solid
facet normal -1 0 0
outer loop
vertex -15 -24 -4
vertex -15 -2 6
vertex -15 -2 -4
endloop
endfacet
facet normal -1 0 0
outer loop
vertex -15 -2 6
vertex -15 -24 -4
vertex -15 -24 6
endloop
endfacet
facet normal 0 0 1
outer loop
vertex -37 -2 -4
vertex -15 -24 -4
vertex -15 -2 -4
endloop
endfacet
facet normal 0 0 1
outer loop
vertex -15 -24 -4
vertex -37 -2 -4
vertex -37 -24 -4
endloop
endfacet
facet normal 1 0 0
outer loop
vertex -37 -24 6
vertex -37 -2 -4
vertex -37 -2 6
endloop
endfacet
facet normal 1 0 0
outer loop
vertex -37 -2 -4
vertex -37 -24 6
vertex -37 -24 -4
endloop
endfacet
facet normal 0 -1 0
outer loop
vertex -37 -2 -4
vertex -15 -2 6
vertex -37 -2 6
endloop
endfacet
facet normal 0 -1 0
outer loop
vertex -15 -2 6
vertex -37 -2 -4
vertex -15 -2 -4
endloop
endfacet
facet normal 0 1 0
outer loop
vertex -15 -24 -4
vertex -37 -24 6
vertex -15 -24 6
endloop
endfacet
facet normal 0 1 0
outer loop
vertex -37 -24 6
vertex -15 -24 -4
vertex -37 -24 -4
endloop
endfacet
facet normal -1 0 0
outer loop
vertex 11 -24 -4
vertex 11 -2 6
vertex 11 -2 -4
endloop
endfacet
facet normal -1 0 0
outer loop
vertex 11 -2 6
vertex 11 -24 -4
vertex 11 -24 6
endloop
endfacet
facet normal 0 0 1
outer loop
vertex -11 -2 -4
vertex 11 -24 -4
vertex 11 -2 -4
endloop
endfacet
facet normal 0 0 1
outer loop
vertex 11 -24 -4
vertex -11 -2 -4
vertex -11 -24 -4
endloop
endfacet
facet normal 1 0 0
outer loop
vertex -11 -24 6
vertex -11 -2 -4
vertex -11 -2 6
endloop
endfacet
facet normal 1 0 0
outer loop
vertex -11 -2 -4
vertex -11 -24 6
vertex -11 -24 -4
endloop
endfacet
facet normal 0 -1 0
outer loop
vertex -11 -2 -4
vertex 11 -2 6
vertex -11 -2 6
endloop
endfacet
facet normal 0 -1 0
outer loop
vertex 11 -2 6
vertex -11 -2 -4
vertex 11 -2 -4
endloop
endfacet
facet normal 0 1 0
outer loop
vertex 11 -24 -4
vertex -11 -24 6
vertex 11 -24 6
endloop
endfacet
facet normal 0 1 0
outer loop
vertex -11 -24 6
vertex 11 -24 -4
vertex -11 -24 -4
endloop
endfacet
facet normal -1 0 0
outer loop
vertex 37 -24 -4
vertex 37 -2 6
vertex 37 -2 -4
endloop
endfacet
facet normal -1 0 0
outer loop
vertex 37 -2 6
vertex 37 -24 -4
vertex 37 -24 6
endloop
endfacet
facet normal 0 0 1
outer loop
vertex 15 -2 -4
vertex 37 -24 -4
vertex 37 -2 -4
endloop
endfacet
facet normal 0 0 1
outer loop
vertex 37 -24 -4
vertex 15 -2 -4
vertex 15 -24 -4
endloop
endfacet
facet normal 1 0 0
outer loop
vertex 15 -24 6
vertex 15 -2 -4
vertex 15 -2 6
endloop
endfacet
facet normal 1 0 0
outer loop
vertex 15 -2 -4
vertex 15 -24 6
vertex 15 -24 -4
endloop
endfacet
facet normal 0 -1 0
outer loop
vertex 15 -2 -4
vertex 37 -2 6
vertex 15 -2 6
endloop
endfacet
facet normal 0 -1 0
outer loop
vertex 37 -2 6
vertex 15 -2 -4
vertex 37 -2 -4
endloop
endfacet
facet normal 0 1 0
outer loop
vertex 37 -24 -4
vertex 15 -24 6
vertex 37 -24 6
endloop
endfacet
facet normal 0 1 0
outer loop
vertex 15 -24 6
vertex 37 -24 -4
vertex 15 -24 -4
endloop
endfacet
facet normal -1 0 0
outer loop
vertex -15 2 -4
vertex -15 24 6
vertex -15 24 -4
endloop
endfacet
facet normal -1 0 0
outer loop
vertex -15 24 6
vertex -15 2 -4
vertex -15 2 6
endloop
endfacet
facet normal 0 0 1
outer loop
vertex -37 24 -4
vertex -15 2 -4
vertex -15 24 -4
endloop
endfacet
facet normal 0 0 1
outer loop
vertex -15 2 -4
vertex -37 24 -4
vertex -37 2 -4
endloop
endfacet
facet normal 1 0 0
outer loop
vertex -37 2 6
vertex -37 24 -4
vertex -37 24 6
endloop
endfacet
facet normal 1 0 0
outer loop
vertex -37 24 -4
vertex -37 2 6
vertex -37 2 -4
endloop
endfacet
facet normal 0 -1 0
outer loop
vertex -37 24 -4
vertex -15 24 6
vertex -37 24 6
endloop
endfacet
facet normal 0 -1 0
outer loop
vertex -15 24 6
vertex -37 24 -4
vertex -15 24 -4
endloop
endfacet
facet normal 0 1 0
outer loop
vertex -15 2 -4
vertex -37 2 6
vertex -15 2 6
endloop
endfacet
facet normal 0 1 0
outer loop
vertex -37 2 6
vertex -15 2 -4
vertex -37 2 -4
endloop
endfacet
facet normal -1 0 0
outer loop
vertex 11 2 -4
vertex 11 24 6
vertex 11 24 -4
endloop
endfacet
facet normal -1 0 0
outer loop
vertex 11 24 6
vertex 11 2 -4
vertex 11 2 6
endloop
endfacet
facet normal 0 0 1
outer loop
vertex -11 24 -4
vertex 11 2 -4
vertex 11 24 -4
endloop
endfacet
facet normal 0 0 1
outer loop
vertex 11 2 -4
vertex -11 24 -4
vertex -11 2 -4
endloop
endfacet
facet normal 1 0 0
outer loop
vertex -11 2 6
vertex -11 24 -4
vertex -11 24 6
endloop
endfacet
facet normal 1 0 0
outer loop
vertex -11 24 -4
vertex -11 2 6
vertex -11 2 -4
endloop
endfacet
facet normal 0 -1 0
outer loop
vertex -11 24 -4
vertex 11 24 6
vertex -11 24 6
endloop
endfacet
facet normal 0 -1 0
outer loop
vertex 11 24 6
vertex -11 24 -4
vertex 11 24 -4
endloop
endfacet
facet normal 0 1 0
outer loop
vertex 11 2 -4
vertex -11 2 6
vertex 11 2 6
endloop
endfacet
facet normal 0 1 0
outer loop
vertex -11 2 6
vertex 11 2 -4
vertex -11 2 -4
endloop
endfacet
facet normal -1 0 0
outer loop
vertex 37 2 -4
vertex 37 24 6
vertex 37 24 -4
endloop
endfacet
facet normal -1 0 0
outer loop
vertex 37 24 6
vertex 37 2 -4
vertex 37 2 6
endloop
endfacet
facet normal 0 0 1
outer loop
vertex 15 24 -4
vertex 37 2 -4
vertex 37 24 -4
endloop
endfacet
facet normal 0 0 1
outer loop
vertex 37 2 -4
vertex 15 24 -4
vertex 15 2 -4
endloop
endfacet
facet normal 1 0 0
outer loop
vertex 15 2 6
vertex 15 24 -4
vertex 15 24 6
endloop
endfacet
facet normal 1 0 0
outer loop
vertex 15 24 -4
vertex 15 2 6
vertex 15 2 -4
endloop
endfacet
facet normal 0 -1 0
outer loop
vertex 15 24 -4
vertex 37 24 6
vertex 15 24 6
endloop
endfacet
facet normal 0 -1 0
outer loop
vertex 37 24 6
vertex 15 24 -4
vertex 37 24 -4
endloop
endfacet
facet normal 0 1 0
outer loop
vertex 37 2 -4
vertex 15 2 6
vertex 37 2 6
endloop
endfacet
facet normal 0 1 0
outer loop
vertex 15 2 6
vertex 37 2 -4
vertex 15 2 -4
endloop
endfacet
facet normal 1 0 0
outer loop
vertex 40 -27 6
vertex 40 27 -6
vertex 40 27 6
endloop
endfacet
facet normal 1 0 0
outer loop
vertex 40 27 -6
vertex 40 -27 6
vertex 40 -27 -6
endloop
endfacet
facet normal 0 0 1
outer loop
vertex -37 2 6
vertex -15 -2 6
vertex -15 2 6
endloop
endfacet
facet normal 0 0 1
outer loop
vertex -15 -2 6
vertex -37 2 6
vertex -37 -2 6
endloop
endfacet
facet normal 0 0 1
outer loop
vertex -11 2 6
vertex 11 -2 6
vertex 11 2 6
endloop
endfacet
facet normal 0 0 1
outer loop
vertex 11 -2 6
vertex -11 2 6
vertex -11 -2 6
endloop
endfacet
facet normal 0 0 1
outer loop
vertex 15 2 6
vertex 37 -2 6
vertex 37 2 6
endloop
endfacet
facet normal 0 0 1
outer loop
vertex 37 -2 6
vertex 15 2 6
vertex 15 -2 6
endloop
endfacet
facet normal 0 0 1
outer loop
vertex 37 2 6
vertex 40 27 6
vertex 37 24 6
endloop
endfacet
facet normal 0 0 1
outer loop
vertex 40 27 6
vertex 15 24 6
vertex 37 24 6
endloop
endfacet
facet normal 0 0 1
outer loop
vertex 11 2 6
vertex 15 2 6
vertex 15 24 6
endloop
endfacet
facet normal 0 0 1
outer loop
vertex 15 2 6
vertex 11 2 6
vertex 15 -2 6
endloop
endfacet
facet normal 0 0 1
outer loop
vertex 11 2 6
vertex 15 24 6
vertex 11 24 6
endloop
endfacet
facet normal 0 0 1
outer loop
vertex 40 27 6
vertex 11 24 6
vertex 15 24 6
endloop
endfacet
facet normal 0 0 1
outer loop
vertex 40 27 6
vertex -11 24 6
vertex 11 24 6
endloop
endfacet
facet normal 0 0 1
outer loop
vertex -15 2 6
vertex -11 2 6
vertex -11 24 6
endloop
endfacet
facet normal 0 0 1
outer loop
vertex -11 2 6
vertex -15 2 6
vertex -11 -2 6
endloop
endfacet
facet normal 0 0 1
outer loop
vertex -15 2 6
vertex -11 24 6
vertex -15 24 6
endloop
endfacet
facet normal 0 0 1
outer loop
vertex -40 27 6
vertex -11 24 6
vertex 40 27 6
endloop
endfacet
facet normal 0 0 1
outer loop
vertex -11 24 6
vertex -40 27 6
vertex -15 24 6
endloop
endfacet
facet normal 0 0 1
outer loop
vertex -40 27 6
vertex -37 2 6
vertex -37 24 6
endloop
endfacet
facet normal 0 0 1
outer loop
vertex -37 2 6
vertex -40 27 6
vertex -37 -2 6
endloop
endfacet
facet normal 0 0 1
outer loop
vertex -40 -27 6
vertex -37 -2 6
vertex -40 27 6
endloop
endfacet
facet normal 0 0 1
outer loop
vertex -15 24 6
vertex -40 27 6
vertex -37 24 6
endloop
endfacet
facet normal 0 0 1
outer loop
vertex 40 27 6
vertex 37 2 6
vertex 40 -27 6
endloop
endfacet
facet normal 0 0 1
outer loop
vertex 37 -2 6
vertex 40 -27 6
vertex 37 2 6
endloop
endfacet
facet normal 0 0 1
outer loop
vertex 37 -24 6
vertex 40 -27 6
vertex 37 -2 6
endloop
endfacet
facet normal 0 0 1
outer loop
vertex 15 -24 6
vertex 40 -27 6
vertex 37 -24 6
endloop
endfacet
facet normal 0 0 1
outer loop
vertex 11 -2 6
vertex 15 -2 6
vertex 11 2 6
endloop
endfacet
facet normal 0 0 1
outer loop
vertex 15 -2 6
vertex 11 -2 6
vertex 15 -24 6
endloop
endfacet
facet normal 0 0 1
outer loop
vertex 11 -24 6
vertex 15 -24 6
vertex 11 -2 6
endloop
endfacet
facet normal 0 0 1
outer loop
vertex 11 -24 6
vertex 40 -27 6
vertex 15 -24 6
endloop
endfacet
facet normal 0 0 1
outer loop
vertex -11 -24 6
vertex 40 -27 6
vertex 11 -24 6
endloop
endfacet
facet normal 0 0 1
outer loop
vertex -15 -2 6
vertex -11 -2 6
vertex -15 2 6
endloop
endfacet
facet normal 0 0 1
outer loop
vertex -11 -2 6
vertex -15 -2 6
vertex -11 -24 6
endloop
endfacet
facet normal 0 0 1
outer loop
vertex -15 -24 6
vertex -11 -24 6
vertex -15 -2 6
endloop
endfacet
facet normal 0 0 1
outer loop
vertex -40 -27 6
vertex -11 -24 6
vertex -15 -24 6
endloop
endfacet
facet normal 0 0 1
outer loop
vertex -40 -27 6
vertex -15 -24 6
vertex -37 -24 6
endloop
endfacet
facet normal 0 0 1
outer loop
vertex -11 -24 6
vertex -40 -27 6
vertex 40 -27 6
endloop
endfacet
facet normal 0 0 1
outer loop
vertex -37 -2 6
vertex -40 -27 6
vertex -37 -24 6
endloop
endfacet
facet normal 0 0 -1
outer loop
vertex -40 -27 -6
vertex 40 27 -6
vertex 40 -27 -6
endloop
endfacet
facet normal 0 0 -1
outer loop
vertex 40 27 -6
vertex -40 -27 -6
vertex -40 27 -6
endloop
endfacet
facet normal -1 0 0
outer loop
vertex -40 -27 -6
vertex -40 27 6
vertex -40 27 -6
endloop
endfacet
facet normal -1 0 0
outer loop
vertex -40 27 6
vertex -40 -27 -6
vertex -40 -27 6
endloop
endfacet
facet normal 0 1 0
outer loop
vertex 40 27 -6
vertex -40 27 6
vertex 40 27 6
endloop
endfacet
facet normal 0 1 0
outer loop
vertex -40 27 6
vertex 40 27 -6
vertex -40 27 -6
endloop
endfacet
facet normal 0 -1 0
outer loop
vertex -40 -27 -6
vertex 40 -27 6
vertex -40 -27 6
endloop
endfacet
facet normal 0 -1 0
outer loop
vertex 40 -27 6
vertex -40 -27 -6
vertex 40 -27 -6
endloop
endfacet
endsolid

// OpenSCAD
$fn = 32;

// ----------------------------------------------------------------------
// Pocket plate 80 x 54 x 12
// 2 x 3 pockets 22 mm square, 10 mm deep
// ----------------------------------------------------------------------

// --- parameters (mm) ---
thickness = 12;  // plate thickness
seat_tol = 0.1;  // tolerance at the seating features
free_tol = 0.5;  // general tolerance on the free sizes
floor_t = 2;     // material left under each pocket
pocket = 22;     // pocket side length
pitch_x = 26;    // pocket pitch along X
pitch_y = 26;    // pocket pitch along Y
cols = 3;        // pockets per row
rows = 2;        // rows of pockets

// --- derived feature positions (mm) ---
depth = thickness - floor_t;        // = 10   pocket depth, down to the floor
span_x = (cols - 1) * pitch_x;      // = 52   distance between outer pockets
span_y = (rows - 1) * pitch_y;      // = 26   distance between outer pocket rows
origin_x = -span_x / 2;             // = -26   X of the first pocket
origin_y = -span_y / 2;             // = -13   Y of the first pocket
plate = [span_x + pocket + 6, span_y + pocket + 6, thickness];  // = [80, 54, 12]   overall size: pockets plus 3 mm of wall on each side
feature_centers = [
  [origin_x + 0 * pitch_x, origin_y + 0 * pitch_y],
  [origin_x + 1 * pitch_x, origin_y + 0 * pitch_y],
  [origin_x + 2 * pitch_x, origin_y + 0 * pitch_y],
  [origin_x + 0 * pitch_x, origin_y + 1 * pitch_y],
  [origin_x + 1 * pitch_x, origin_y + 1 * pitch_y],
  [origin_x + 2 * pitch_x, origin_y + 1 * pitch_y]
];   // pocket centres, used verbatim by the cutter loop

// plate outline, then one pocket per centre in feature_centers
difference() {
  cube(plate, center = true);
  for (centre = feature_centers)
    translate([centre[0] - pocket / 2, centre[1] - pocket / 2, plate[2] / 2 - depth])
      cube([pocket, pocket, depth + 1]);  // centred on the declared pocket centre
}
